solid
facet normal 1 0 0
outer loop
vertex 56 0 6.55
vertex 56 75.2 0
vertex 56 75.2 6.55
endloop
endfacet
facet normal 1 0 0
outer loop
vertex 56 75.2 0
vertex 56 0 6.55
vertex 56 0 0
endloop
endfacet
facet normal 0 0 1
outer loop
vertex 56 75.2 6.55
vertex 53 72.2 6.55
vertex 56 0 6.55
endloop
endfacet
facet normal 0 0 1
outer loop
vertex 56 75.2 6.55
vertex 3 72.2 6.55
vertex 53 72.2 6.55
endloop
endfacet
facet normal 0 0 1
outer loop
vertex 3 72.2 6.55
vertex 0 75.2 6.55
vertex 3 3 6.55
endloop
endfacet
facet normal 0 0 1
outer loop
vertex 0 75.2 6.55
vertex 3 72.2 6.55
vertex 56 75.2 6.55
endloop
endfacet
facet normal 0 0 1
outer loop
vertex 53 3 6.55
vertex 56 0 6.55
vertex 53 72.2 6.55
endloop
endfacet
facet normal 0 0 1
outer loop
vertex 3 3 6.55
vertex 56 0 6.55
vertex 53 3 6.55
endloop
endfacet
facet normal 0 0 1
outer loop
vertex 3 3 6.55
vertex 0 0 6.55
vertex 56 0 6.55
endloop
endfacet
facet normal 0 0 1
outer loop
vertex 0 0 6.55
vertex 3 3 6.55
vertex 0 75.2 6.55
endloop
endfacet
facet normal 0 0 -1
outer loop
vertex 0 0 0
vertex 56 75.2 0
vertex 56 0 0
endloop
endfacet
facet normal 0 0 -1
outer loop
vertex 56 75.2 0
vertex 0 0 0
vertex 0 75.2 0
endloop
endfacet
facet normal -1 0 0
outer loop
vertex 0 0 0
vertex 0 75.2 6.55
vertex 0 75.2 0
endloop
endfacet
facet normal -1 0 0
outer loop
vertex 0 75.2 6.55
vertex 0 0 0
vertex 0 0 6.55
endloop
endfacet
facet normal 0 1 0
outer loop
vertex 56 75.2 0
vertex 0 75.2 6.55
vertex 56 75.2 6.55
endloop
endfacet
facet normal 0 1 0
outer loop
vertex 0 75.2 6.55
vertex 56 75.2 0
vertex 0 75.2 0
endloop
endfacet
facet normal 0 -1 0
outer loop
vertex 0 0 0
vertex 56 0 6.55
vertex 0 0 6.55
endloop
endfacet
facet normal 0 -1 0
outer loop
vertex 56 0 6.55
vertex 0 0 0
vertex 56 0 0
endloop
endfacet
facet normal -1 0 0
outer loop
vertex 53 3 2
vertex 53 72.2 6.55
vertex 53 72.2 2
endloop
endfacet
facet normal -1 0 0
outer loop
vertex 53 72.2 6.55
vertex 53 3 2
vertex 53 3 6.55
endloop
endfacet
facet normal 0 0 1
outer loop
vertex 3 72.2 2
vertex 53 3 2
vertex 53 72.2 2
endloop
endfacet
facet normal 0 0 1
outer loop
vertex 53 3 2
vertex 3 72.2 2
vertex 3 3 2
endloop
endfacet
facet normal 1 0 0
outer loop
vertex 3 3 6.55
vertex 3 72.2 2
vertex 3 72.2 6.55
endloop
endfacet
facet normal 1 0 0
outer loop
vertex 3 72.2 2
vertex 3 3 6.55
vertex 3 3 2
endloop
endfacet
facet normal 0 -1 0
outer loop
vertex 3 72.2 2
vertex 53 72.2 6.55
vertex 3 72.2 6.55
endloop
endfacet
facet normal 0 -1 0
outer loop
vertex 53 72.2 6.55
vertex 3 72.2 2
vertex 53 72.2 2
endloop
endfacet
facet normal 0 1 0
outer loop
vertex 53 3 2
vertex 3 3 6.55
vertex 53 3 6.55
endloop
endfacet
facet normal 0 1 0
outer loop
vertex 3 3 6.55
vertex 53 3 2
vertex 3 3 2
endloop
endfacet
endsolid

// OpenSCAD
// MediaCow Micro - CTCL 2021-2024
// Purpose: Parametric case generation for MediaCow Micro devices
// Created: January 1, 2025
// Modified: January 1, 2025

// Units: mm

/* [Hidden] */
disps = [
    [
        "CFAF240320J0-028TN", 
        50, // Module Width
        69.2, // Module Length
        43.2, // Active Area Width
        57.6, // Active Area Length
        4.55 // Module Thickness
    ]
];

function selector(item) = disps[search([item], disps)[0]];

/* [Configuration] */
disp = "CFAF240320J0-028TN"; // [CFAF240320J0-028TN]
dispdata = selector(disp);

draw_mode = "dispmount"; // [dispmount, dispcover, base, assembled, exploded]

// Display Mount Configuration

// Width of walls around display cutout
dispmount_walls = 3; // [1:15]
// Height of the display mount base
dispmount_base = 2; // [1:5]

// Base configuration

// Width of outer walls
base_walls = 2;
// Width of inner walls that the display mount rests on
base_inner_walls = 2;

module dispcover() {
    
}

module dispmount() {
    difference() {
        // Base
        cube([dispdata[1] + (dispmount_walls * 2), dispdata[2] + (dispmount_walls * 2), dispdata[5] + dispmount_base]);
        // Display
        translate([dispmount_walls, dispmount_walls, dispmount_base]) {
            cube([dispdata[1], dispdata[2], dispdata[5] + 0.1]);
        }
    }

}

module base() {
    
}

if (draw_mode == "dispmount") {
    dispmount();
} else if  (draw_mode == "dispcover") {
    dispcover();
} else if (draw_mode == "base") {
    base();
} else if (draw_mode == "assembled") {

} else if (draw_mode == "exploded") {

} else {
    echo("No mode selected");
}
